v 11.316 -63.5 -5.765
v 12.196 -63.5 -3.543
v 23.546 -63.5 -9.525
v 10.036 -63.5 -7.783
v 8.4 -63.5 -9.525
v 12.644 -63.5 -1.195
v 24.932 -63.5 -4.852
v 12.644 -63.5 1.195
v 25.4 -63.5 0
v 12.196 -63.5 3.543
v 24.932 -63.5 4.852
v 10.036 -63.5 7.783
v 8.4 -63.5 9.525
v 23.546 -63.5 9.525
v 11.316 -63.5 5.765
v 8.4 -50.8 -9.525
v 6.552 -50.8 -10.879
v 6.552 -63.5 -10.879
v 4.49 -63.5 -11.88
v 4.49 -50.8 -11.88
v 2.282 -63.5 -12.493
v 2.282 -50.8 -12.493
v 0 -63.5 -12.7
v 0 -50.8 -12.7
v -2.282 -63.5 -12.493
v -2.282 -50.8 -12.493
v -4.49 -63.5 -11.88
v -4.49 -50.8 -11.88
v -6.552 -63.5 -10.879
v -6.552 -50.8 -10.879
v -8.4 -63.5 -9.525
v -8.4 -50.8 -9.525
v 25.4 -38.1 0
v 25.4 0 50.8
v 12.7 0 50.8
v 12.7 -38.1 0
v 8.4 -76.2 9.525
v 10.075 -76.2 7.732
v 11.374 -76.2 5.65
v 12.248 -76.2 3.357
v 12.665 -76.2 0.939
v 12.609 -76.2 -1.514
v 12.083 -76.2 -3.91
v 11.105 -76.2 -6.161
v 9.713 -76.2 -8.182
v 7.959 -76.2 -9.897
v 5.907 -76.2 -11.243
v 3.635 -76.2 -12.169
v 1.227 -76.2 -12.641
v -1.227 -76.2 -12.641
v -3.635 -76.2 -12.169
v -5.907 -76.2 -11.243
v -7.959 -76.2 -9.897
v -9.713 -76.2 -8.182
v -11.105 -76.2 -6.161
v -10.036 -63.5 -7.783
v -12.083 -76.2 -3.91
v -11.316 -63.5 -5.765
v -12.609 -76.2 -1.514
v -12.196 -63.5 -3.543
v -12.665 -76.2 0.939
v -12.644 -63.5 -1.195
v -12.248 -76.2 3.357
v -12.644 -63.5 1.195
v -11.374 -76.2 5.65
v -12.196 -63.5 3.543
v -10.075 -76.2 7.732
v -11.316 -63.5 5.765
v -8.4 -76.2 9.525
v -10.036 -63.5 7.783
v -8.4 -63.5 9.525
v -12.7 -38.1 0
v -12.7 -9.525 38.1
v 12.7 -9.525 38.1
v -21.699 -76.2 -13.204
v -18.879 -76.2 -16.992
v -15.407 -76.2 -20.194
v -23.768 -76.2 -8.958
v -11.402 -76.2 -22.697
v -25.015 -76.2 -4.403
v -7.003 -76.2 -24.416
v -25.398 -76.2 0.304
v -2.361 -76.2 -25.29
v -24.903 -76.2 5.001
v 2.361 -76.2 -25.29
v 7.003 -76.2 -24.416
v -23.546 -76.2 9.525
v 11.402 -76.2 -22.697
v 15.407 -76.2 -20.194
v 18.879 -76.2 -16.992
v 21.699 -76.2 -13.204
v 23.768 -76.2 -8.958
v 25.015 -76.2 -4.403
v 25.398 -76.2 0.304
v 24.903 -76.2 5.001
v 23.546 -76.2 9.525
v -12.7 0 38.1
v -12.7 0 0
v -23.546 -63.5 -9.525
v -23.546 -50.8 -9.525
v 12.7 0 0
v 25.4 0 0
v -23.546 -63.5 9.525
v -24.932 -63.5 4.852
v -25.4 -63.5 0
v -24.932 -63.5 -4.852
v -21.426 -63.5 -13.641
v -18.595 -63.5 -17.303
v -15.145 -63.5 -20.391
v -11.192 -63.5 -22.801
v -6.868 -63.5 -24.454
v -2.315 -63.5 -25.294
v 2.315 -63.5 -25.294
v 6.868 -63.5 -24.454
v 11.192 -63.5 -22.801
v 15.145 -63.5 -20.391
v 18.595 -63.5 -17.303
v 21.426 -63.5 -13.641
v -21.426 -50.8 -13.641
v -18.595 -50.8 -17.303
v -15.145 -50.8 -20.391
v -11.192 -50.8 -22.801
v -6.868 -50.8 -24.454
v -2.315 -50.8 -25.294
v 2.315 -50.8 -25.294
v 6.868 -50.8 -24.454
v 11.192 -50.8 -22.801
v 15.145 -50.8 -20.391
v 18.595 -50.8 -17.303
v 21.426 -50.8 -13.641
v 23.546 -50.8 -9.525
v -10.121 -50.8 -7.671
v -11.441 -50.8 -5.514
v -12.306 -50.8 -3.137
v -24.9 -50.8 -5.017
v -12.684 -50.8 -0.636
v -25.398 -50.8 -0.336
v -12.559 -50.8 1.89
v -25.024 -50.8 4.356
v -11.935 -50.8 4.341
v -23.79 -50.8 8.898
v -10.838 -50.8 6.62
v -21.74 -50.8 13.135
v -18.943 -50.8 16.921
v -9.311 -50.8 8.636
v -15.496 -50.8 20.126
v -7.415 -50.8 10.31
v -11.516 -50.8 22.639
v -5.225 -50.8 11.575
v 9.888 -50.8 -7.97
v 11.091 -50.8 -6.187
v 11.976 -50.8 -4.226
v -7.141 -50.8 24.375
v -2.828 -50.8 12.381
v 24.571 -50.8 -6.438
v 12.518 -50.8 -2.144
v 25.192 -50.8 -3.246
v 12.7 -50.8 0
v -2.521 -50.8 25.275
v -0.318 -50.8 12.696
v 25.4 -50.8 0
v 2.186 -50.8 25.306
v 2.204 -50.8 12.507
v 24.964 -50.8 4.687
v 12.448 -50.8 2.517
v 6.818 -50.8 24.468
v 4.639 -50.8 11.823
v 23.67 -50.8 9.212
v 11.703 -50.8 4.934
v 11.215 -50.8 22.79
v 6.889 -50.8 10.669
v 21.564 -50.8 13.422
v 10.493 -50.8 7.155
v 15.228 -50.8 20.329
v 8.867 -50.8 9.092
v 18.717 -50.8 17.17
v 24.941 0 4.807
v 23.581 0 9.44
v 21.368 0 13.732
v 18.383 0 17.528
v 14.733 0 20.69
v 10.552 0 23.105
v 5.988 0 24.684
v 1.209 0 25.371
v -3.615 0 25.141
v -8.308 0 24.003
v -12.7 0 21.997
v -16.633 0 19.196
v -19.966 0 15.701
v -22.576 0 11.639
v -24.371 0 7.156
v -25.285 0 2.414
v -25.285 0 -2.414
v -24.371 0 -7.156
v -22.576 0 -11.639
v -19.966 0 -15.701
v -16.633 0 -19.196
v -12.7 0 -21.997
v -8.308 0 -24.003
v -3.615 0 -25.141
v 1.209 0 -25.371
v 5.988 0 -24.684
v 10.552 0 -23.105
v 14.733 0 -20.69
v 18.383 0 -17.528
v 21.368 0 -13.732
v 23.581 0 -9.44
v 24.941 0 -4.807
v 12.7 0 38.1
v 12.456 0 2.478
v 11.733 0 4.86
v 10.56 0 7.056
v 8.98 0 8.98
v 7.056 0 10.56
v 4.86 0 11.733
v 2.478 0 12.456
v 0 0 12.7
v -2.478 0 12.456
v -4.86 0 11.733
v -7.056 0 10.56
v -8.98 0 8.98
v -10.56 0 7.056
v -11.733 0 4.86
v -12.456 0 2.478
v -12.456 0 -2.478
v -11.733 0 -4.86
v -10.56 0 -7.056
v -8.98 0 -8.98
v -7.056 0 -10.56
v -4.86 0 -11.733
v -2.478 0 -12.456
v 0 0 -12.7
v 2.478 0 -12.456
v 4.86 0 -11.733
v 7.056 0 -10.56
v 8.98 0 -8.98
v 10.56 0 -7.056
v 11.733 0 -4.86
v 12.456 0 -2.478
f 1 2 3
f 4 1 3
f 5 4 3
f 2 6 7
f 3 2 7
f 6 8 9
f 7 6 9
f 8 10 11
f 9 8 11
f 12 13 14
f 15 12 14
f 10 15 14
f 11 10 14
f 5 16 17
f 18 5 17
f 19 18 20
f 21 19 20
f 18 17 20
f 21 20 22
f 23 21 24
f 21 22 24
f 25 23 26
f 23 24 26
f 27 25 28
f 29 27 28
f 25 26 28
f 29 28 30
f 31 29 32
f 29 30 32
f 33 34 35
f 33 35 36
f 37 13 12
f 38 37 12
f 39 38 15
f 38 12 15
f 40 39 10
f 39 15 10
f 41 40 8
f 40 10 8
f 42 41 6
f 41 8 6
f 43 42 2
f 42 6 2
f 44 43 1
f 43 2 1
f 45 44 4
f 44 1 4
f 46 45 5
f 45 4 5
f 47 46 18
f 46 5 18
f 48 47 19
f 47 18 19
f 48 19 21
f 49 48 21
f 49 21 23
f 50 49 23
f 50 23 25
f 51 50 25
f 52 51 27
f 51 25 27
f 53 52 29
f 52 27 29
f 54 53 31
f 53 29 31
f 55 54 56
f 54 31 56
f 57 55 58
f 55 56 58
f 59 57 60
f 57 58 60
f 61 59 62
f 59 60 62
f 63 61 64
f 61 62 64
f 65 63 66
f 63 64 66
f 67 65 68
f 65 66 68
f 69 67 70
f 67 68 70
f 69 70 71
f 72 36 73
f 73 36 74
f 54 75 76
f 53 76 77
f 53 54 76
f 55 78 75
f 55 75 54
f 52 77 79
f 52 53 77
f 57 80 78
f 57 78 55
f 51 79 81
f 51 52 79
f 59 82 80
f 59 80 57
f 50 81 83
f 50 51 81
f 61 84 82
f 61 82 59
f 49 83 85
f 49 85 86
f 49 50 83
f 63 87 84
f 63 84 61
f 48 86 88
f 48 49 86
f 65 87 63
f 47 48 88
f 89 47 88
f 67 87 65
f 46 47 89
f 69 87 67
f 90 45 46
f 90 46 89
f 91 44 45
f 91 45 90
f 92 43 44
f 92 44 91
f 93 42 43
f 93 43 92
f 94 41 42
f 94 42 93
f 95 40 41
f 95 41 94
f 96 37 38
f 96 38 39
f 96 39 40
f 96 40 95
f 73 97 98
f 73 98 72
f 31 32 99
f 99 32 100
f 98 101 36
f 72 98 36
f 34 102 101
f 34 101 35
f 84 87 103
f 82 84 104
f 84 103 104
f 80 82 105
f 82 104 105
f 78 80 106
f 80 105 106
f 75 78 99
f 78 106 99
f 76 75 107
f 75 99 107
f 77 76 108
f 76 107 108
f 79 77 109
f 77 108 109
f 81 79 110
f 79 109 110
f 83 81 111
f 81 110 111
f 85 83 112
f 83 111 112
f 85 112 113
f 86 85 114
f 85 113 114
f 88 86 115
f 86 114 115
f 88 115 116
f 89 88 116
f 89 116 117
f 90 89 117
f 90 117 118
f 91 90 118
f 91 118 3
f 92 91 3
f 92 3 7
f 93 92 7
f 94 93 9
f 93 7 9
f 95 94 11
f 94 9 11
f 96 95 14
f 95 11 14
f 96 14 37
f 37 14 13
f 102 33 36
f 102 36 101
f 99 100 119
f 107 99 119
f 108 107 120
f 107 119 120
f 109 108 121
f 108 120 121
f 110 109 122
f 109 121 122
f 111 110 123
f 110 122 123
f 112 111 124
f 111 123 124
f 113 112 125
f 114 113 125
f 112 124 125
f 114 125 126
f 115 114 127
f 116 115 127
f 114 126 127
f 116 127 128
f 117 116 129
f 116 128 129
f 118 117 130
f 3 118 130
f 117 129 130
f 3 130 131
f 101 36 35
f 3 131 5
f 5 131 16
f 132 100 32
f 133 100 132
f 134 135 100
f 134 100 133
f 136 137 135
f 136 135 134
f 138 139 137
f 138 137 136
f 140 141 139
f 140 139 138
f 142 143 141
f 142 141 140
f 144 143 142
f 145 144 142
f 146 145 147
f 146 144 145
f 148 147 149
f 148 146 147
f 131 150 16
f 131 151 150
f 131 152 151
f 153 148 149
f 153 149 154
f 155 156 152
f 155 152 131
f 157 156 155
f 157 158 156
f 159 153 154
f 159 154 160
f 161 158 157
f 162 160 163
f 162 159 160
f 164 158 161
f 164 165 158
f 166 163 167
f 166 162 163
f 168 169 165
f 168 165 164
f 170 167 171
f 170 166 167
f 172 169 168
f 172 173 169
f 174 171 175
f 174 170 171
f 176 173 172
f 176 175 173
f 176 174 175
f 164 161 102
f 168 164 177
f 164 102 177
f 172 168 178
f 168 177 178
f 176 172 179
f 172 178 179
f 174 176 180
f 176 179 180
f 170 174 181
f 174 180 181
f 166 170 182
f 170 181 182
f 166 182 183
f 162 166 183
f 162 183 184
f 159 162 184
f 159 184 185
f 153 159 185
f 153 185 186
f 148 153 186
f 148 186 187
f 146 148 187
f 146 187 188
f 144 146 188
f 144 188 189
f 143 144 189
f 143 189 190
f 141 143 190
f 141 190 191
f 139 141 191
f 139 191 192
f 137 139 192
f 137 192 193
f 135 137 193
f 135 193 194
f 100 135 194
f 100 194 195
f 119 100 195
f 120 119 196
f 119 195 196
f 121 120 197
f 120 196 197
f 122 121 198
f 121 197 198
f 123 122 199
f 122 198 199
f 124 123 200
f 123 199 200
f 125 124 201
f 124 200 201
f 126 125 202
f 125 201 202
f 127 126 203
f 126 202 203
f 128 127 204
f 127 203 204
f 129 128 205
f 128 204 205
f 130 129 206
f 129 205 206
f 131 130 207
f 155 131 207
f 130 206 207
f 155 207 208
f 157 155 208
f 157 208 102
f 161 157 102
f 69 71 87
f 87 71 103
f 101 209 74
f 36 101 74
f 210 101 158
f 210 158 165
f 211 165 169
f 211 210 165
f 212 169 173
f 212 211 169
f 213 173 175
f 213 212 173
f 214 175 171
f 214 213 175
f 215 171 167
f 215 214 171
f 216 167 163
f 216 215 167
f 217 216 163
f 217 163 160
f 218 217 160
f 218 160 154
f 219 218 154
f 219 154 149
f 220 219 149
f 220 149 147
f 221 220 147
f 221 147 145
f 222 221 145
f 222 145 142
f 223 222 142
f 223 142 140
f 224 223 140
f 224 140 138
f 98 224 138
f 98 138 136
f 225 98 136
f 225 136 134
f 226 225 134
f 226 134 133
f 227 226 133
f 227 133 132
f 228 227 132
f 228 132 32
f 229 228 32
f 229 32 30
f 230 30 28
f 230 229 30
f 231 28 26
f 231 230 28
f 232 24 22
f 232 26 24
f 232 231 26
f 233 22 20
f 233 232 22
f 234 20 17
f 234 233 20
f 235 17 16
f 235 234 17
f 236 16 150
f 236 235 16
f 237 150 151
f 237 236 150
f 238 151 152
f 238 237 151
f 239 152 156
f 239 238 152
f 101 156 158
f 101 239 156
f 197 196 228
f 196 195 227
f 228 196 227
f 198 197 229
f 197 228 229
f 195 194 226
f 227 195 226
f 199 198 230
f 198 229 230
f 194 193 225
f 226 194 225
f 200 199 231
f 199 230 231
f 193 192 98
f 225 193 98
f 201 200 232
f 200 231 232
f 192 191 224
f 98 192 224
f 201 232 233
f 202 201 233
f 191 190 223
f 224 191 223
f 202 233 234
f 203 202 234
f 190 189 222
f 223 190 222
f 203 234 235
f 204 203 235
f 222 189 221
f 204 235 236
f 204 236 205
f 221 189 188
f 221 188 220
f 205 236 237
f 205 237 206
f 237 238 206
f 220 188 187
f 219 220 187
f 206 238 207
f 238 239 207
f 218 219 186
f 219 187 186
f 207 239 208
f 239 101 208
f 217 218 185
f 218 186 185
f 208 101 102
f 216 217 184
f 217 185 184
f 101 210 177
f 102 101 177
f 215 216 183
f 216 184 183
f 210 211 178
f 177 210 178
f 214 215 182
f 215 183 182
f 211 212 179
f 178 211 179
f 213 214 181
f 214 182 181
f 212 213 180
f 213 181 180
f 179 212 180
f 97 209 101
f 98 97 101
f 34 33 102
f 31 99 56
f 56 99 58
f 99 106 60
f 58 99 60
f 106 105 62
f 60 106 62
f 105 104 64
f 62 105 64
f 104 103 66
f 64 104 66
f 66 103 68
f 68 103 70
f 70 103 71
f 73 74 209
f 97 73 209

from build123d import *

# Parameters (mm, degrees)
F0_R      = 25.4
F0_R_2    = 12.7
F1_DEPTH  = 50.8
F4_DEPTH  = 12.7
F6_DEPTH  = 25.4
F8_DEPTH  = 12.7
F10_DEPTH = 12.7


with BuildPart() as f1:
    # F0 (on Front) → F1 (new body)
    with BuildSketch(Plane.XZ):
        Circle(F0_R)
        Circle(F0_R_2, mode=Mode.SUBTRACT)
    extrude(amount=F1_DEPTH)

    # F7 (on face) → F8 (join)
    with BuildSketch(Plane.XZ.offset(50.8)):
        with BuildLine():
            ThreePointArc((8.40026, -9.525), (0, -12.7), (-8.40026, -9.525))
            Line((-8.40026, -9.525), (-23.54643, -9.525))
            ThreePointArc((-23.54643, -9.525), (0, -25.4), (23.54643, -9.525))
            Line((23.54643, -9.525), (8.40026, -9.525))
        make_face()
    extrude(amount=F8_DEPTH)

    # F9 (on face) → F10 (join)
    with BuildSketch(Plane.XZ.offset(63.5)):
        with BuildLine():
            ThreePointArc((8.40026, 9.525), (0, -12.7), (-8.40026, 9.525))
            Line((-8.40026, 9.525), (-23.54643, 9.525))
            ThreePointArc((-23.54643, 9.525), (0, -25.4), (23.54643, 9.525))
            Line((23.54643, 9.525), (8.40026, 9.525))
        make_face()
    extrude(amount=F10_DEPTH)


with BuildPart() as f4:
    # F3 (on offset) → F4 (new body)
    with BuildSketch(Plane.YZ.offset(25.4)):
        Polygon((-38.1, 0), (0, 0), (0, 50.8), align=None)
    extrude(amount=-F4_DEPTH)


with BuildPart() as f6:
    # F5 (on face) → F6 (new body)
    with BuildSketch(Plane(origin=(12.7, 0, 0), x_dir=(0, -1, 0), z_dir=(-1, 0, 0))):
        Polygon((0, 38.1), (0, 0), (38.1, 0), (9.525, 38.1), align=None)
    extrude(amount=F6_DEPTH)


solid = Compound([f1.part, f4.part, f6.part])
